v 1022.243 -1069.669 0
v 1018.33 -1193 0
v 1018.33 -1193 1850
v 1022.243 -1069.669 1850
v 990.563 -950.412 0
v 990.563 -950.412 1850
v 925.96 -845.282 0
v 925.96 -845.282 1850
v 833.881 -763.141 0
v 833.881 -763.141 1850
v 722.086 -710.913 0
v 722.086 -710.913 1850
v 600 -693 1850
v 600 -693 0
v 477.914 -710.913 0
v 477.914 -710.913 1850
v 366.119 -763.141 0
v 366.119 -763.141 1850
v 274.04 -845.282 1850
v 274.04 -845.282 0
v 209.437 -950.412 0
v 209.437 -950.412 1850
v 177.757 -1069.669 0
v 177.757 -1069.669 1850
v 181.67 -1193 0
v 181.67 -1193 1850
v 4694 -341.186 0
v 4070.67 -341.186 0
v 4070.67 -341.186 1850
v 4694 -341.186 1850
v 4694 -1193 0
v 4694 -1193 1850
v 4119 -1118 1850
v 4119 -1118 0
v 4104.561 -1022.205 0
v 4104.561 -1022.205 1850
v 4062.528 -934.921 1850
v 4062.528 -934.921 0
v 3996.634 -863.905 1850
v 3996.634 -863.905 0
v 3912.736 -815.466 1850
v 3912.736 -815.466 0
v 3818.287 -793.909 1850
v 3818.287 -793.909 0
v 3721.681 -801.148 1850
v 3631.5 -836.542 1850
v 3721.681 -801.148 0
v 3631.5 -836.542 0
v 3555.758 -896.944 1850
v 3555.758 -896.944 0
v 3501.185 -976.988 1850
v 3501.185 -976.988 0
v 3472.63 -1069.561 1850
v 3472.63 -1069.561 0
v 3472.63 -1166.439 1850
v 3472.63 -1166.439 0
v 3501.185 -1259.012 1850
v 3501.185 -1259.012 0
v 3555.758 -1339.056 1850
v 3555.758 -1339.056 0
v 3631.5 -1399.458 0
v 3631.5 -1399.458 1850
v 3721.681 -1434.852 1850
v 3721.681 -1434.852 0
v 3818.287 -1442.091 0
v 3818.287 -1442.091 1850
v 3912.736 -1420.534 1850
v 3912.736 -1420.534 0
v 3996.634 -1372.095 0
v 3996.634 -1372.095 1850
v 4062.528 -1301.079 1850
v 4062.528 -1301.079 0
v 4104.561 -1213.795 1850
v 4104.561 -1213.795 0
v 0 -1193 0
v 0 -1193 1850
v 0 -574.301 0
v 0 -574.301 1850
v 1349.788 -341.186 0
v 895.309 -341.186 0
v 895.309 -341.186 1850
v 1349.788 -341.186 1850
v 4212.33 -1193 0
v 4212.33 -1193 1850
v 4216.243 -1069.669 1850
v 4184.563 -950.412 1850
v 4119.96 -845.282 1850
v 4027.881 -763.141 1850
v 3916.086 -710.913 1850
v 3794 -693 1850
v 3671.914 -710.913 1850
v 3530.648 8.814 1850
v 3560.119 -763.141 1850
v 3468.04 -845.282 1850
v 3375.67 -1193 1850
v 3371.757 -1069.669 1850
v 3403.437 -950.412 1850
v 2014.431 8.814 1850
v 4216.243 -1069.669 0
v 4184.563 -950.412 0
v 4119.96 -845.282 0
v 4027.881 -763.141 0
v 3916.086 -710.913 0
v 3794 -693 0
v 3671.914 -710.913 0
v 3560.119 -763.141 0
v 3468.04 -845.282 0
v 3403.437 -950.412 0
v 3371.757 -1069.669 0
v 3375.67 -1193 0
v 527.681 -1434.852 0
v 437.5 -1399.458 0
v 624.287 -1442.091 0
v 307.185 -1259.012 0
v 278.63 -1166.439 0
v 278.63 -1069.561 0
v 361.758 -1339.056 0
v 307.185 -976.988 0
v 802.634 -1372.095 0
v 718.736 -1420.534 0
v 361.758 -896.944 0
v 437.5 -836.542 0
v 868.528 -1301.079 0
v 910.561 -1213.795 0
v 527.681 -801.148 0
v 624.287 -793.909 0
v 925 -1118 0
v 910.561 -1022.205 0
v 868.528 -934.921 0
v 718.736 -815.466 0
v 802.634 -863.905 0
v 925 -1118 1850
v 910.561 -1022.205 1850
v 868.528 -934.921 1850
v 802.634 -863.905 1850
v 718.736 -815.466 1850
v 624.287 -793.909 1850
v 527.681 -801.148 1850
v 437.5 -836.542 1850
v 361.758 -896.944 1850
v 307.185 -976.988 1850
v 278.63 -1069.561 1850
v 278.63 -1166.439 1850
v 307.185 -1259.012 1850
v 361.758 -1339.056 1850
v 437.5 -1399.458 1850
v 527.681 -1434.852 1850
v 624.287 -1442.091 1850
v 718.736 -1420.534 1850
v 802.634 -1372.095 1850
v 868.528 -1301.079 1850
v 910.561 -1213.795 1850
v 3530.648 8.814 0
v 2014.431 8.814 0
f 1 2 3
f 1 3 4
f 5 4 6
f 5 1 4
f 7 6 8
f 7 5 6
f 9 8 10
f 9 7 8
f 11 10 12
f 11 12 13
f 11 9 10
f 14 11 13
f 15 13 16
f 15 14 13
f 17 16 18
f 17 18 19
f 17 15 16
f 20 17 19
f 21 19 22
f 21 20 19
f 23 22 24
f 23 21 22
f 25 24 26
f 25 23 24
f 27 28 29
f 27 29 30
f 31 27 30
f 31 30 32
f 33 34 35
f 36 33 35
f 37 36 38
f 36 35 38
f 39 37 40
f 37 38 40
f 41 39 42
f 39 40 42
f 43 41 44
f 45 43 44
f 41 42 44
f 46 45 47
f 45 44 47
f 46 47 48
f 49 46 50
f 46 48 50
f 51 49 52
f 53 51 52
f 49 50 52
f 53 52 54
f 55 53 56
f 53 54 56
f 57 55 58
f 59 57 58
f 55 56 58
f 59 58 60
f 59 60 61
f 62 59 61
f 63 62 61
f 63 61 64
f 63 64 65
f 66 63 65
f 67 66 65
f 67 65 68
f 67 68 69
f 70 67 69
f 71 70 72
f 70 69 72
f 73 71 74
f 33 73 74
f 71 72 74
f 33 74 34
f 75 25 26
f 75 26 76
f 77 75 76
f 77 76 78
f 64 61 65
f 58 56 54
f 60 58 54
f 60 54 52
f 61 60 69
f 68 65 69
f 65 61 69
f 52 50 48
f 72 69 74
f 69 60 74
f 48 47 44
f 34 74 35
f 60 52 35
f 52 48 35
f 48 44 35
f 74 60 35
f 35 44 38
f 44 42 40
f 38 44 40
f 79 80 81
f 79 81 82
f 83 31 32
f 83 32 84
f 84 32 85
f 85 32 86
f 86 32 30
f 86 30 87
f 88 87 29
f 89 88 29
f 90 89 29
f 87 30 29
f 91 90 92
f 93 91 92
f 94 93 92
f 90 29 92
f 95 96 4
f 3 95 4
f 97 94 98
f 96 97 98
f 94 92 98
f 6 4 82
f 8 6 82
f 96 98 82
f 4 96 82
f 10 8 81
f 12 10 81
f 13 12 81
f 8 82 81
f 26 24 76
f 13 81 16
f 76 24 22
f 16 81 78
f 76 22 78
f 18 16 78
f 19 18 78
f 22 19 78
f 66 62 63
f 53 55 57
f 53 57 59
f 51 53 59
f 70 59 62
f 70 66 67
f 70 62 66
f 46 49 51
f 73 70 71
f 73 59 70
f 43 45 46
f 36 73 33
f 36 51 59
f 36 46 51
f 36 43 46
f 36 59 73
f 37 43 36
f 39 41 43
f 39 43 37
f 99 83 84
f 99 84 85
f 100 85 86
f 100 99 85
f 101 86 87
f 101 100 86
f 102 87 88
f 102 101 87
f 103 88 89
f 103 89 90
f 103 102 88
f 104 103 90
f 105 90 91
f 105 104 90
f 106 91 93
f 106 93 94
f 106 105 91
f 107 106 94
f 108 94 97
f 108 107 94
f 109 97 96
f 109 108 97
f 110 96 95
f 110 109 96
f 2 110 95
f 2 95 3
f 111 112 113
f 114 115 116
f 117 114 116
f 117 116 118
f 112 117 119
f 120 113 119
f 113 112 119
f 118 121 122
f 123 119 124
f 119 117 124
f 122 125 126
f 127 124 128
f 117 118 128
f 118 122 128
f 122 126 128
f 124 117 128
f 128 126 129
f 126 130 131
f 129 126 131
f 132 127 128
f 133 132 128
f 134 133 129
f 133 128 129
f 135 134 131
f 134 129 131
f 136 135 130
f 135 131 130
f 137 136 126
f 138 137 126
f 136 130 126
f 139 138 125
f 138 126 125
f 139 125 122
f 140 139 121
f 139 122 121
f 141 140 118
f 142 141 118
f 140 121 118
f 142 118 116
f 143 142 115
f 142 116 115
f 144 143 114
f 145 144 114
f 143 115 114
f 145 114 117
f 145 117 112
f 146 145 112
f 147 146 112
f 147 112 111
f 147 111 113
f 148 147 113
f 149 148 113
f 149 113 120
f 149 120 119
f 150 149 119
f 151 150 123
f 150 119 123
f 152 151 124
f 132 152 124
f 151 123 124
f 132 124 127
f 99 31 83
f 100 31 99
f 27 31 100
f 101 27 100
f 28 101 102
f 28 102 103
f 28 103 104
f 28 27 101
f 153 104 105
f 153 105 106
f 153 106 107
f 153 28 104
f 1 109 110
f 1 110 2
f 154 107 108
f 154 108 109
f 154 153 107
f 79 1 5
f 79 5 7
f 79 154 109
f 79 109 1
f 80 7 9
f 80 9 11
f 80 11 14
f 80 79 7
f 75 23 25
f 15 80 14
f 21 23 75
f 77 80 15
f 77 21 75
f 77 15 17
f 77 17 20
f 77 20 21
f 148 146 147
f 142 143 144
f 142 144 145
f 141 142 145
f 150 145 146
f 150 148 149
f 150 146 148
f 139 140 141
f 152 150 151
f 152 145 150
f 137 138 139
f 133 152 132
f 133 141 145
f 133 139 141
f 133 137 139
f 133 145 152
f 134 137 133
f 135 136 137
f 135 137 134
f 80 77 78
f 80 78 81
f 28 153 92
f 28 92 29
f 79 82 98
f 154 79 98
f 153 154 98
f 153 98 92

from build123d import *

# Parameters (mm, degrees)
BOSS_EXTRUDE1_DEPTH   = 1850
SKETCH1_R             = 325
BOSS_EXTRUDE1_2_DEPTH = 1850
BOSS_EXTRUDE1_3_DEPTH = 1850


with BuildPart() as part:
    # Sketch1 → Boss-Extrude1 (new body)
    with BuildSketch(Plane.XY):
        with BuildLine():
            ThreePointArc((4212.330013267, -1193), (3794, -693), (3375.669986733, -1193))
            Line((3375.669986733, -1193), (1018.330013267, -1193))
            ThreePointArc((1018.330013267, -1193), (600, -693), (181.669986733, -1193))
            Line((181.669986733, -1193), (0, -1193))
            Line((0, -1193), (0, -574.300771888))
            Line((0, -574.300771888), (895.308793073, -341.186371335))
            Line((895.308793073, -341.186371335), (1349.787903831, -341.186371335))
            Line((1349.787903831, -341.186371335), (2014.430951703, 8.813628665))
            Line((2014.430951703, 8.813628665), (3530.647904664, 8.813628665))
            Line((3530.647904664, 8.813628665), (4070.67038106, -341.186371335))
            Line((4070.67038106, -341.186371335), (4694, -341.186371335))
            Line((4694, -341.186371335), (4694, -1193))
            Line((4694, -1193), (4212.330013267, -1193))
        make_face()
    extrude(amount=BOSS_EXTRUDE1_DEPTH)


with BuildPart() as body_2:
    # Sketch1 → Boss-Extrude1 2 (new body)
    with BuildSketch(Plane.XY):
        with Locations((600, -1118)):
            Circle(SKETCH1_R)
    extrude(amount=BOSS_EXTRUDE1_2_DEPTH)


with BuildPart() as body_3:
    # Sketch1 → Boss-Extrude1 3 (new body)
    with BuildSketch(Plane.XY):
        with Locations((3794, -1118)):
            Circle(SKETCH1_R)
    extrude(amount=BOSS_EXTRUDE1_3_DEPTH)


solid = Compound([part.part, body_2.part, body_3.part])
